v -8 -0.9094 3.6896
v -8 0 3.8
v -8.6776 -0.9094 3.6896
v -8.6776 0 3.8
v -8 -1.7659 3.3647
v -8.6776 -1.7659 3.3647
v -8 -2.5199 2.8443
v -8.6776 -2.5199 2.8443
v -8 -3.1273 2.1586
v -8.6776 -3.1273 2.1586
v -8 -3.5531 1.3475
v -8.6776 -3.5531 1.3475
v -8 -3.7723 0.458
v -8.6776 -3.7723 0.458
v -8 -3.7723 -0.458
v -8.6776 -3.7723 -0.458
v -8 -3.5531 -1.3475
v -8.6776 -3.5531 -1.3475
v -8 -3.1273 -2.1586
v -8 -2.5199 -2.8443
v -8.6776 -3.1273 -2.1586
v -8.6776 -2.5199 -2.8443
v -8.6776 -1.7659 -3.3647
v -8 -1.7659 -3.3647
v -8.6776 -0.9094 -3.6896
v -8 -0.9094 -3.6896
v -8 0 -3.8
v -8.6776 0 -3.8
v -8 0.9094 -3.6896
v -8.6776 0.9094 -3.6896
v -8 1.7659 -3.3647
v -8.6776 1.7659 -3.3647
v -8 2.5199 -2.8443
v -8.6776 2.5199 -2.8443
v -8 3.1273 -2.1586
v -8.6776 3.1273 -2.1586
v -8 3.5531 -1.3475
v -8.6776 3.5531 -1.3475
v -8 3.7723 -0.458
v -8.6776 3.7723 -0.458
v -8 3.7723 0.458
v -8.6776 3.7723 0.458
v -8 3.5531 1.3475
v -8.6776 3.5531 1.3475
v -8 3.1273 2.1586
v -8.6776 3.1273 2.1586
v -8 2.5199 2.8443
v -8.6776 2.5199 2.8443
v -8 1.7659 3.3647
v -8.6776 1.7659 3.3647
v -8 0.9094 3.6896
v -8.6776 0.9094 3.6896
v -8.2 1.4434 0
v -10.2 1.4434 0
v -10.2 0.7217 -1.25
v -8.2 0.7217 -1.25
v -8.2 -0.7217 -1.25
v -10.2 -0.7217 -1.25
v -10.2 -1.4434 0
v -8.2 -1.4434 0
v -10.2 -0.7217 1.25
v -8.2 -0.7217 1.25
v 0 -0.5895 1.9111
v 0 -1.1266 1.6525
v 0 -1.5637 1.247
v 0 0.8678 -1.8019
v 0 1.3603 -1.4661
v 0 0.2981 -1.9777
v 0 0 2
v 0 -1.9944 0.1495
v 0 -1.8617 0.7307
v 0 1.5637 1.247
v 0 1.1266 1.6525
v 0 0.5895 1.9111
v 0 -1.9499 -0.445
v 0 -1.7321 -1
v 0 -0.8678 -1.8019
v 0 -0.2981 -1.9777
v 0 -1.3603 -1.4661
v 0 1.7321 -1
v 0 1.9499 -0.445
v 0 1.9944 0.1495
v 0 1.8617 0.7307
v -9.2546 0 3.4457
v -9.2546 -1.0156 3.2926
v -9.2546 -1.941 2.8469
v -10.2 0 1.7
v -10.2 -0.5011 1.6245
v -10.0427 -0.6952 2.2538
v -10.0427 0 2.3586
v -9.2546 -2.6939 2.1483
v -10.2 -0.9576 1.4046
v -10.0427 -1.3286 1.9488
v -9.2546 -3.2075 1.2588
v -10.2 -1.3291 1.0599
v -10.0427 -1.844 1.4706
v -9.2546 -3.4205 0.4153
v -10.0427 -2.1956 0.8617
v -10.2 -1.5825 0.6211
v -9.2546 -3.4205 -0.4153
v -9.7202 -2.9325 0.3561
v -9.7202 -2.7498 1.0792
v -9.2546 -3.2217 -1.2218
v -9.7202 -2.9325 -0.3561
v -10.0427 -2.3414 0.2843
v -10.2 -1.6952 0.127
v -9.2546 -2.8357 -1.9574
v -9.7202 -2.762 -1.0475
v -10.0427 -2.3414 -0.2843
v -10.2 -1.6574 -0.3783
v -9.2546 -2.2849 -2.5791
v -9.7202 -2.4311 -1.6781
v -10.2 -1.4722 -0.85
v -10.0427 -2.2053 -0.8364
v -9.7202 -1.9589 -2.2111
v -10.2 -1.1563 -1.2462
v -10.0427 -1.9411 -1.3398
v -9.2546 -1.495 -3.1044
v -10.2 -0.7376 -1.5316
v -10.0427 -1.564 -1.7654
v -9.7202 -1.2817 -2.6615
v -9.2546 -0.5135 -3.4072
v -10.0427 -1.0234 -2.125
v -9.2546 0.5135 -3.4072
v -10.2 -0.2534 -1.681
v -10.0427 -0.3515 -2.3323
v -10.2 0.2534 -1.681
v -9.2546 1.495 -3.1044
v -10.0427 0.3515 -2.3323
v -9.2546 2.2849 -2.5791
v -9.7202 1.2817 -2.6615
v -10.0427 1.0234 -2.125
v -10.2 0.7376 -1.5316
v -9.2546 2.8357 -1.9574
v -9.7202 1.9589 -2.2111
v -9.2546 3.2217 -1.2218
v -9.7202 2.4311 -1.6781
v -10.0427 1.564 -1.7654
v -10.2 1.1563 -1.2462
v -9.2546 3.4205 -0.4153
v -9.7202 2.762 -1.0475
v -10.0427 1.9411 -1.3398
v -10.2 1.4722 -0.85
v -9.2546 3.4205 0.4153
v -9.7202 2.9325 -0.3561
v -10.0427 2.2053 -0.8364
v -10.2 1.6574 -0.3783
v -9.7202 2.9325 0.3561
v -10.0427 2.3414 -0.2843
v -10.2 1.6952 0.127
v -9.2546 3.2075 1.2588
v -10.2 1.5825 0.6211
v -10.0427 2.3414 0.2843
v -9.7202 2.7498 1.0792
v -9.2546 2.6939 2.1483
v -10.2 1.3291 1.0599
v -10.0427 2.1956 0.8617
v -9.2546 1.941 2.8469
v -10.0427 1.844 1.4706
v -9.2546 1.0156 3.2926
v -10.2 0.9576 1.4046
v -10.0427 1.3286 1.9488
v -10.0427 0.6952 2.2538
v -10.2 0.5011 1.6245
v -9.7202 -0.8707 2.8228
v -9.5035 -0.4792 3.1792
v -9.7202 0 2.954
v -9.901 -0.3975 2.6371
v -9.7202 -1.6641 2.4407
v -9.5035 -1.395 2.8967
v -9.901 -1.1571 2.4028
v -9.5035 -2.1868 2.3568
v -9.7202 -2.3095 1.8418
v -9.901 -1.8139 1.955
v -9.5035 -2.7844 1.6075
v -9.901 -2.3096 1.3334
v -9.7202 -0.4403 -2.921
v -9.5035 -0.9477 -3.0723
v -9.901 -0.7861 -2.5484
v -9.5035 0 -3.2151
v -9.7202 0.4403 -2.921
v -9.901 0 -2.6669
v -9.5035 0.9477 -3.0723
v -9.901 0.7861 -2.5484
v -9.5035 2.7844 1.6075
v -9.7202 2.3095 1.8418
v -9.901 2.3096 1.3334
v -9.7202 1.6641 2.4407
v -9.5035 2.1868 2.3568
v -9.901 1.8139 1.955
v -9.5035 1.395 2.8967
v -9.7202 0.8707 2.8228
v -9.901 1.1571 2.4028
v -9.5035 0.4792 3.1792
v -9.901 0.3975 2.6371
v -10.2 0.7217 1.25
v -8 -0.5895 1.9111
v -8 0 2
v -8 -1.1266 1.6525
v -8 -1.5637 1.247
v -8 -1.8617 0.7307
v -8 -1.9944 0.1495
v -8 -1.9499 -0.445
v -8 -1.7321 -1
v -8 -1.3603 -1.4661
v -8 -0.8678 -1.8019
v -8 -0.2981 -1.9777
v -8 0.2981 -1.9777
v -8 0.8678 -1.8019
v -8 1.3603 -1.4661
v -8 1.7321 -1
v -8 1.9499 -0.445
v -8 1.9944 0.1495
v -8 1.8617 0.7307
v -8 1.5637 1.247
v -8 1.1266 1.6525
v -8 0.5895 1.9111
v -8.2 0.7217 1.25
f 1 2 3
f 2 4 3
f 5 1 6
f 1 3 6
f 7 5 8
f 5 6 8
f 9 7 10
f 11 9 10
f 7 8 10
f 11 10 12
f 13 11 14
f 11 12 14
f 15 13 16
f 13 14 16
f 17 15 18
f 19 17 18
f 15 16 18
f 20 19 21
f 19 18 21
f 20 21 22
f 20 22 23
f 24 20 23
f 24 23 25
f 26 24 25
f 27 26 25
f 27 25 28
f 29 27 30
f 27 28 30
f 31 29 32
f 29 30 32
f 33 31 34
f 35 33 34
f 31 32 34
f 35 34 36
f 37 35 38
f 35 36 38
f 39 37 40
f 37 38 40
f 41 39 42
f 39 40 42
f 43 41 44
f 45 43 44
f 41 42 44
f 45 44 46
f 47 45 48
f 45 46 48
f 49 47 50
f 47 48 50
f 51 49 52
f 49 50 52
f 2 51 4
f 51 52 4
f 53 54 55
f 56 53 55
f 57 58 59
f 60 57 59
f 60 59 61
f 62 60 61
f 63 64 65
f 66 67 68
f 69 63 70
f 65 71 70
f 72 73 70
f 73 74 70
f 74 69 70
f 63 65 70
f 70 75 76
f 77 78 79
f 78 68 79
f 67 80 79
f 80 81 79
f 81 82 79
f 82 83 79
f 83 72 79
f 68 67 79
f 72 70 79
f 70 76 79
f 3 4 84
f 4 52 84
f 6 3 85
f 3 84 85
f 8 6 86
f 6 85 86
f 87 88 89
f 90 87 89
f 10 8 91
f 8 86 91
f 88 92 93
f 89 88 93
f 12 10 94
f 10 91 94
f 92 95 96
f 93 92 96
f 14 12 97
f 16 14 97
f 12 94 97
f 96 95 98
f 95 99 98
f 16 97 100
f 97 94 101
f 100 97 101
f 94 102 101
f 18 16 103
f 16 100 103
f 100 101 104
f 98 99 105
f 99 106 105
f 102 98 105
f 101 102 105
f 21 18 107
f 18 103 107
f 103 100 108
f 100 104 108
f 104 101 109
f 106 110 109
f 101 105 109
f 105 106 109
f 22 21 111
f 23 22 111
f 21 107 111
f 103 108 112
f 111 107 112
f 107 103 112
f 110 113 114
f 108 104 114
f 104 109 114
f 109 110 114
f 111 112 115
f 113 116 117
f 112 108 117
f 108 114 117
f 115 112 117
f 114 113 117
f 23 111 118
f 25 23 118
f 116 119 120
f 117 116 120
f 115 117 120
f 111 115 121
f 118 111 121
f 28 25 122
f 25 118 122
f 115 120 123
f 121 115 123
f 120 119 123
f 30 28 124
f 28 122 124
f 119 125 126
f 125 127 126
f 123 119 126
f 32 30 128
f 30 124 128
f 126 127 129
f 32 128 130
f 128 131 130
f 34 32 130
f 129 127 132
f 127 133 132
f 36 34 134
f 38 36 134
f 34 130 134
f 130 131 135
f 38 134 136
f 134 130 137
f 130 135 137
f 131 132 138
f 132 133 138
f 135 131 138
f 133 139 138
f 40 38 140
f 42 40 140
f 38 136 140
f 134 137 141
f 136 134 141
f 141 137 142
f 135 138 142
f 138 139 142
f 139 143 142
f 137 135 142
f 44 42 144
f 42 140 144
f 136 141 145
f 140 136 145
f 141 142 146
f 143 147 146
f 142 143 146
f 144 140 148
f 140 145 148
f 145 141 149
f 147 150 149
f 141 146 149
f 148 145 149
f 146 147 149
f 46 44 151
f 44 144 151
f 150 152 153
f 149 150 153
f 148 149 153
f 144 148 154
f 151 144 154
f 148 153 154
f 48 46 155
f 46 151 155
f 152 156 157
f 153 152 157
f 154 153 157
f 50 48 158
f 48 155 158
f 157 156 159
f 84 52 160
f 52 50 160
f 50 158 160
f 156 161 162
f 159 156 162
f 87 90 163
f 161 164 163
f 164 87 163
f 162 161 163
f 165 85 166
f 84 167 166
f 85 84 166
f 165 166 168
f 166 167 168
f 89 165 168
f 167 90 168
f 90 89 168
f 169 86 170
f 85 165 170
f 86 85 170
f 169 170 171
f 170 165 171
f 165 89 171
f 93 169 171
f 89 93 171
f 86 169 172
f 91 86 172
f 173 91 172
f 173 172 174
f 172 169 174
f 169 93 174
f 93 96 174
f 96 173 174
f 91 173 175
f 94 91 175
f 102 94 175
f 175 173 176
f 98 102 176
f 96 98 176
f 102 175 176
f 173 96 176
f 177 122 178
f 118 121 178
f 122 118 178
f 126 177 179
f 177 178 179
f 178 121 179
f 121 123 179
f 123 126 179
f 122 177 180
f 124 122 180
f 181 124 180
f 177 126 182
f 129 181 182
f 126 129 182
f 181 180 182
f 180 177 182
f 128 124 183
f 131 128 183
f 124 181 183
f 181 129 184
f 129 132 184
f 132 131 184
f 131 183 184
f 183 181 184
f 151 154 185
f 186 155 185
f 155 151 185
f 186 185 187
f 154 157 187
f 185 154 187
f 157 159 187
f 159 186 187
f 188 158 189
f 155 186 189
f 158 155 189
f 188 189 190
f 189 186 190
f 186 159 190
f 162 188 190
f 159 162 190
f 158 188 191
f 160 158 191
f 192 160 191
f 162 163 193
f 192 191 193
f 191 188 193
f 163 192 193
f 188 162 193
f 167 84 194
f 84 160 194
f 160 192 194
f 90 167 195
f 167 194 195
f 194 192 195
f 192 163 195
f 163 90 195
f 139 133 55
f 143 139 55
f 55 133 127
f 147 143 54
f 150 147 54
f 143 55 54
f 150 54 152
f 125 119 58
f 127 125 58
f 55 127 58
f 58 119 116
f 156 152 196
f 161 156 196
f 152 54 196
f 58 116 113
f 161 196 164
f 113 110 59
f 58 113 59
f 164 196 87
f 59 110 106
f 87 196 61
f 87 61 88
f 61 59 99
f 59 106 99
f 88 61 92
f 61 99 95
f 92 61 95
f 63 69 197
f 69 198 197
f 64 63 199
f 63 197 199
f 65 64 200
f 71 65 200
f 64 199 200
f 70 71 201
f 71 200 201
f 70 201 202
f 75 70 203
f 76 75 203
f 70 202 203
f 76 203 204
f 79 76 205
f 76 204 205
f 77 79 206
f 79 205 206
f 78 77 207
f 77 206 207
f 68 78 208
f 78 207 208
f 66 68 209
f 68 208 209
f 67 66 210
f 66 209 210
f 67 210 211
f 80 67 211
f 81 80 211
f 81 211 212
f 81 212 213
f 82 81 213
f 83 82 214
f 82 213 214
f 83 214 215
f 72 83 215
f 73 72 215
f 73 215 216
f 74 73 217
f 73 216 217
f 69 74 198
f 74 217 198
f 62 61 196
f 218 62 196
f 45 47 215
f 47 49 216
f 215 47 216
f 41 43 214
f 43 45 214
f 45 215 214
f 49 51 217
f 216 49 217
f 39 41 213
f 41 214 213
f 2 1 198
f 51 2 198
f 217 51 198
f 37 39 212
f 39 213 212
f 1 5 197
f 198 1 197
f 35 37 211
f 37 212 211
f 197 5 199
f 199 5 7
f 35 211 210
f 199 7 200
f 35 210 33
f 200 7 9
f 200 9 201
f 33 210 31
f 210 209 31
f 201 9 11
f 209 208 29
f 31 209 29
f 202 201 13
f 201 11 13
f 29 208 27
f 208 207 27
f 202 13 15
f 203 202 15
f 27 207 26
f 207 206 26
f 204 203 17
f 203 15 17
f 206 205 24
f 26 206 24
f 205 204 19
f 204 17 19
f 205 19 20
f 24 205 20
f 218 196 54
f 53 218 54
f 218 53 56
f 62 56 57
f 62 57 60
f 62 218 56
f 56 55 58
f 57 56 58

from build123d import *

# Parameters (mm, degrees)
F3_DEPTH = 2


with BuildPart() as f1:
    # F0 (on Front) → F1 (revolve)
    with BuildSketch(Plane.XZ):
        with BuildLine():
            Line((-10.2, 0), (0, 0))
            Line((0, 0), (0, 2))
            Line((0, 2), (-8, 2))
            Line((-8, 2), (-8, 3.8))
            Line((-8, 3.8), (-8.677624, 3.8))
            ThreePointArc((-8.677624, 3.8), (-9.72023, 2.954011), (-10.2, 1.7))
            Line((-10.2, 1.7), (-10.2, 0))
        make_face()
    revolve(axis=Axis((-5.1, 0, 0), (1, 0, 0)))

    # F2 (on face) → F3 (cut)
    with BuildSketch(Plane(origin=(-10.2, 0, 0), x_dir=(0, -1, 0), z_dir=(-1, 0, 0))):
        Polygon((0.721688, 1.25), (-0.721688, 1.25), (-1.443376, 0), (-0.721688, -1.25), (0.721688, -1.25), (1.443376, 0), align=None)
    extrude(amount=-F3_DEPTH, mode=Mode.SUBTRACT)


solid = f1.part
